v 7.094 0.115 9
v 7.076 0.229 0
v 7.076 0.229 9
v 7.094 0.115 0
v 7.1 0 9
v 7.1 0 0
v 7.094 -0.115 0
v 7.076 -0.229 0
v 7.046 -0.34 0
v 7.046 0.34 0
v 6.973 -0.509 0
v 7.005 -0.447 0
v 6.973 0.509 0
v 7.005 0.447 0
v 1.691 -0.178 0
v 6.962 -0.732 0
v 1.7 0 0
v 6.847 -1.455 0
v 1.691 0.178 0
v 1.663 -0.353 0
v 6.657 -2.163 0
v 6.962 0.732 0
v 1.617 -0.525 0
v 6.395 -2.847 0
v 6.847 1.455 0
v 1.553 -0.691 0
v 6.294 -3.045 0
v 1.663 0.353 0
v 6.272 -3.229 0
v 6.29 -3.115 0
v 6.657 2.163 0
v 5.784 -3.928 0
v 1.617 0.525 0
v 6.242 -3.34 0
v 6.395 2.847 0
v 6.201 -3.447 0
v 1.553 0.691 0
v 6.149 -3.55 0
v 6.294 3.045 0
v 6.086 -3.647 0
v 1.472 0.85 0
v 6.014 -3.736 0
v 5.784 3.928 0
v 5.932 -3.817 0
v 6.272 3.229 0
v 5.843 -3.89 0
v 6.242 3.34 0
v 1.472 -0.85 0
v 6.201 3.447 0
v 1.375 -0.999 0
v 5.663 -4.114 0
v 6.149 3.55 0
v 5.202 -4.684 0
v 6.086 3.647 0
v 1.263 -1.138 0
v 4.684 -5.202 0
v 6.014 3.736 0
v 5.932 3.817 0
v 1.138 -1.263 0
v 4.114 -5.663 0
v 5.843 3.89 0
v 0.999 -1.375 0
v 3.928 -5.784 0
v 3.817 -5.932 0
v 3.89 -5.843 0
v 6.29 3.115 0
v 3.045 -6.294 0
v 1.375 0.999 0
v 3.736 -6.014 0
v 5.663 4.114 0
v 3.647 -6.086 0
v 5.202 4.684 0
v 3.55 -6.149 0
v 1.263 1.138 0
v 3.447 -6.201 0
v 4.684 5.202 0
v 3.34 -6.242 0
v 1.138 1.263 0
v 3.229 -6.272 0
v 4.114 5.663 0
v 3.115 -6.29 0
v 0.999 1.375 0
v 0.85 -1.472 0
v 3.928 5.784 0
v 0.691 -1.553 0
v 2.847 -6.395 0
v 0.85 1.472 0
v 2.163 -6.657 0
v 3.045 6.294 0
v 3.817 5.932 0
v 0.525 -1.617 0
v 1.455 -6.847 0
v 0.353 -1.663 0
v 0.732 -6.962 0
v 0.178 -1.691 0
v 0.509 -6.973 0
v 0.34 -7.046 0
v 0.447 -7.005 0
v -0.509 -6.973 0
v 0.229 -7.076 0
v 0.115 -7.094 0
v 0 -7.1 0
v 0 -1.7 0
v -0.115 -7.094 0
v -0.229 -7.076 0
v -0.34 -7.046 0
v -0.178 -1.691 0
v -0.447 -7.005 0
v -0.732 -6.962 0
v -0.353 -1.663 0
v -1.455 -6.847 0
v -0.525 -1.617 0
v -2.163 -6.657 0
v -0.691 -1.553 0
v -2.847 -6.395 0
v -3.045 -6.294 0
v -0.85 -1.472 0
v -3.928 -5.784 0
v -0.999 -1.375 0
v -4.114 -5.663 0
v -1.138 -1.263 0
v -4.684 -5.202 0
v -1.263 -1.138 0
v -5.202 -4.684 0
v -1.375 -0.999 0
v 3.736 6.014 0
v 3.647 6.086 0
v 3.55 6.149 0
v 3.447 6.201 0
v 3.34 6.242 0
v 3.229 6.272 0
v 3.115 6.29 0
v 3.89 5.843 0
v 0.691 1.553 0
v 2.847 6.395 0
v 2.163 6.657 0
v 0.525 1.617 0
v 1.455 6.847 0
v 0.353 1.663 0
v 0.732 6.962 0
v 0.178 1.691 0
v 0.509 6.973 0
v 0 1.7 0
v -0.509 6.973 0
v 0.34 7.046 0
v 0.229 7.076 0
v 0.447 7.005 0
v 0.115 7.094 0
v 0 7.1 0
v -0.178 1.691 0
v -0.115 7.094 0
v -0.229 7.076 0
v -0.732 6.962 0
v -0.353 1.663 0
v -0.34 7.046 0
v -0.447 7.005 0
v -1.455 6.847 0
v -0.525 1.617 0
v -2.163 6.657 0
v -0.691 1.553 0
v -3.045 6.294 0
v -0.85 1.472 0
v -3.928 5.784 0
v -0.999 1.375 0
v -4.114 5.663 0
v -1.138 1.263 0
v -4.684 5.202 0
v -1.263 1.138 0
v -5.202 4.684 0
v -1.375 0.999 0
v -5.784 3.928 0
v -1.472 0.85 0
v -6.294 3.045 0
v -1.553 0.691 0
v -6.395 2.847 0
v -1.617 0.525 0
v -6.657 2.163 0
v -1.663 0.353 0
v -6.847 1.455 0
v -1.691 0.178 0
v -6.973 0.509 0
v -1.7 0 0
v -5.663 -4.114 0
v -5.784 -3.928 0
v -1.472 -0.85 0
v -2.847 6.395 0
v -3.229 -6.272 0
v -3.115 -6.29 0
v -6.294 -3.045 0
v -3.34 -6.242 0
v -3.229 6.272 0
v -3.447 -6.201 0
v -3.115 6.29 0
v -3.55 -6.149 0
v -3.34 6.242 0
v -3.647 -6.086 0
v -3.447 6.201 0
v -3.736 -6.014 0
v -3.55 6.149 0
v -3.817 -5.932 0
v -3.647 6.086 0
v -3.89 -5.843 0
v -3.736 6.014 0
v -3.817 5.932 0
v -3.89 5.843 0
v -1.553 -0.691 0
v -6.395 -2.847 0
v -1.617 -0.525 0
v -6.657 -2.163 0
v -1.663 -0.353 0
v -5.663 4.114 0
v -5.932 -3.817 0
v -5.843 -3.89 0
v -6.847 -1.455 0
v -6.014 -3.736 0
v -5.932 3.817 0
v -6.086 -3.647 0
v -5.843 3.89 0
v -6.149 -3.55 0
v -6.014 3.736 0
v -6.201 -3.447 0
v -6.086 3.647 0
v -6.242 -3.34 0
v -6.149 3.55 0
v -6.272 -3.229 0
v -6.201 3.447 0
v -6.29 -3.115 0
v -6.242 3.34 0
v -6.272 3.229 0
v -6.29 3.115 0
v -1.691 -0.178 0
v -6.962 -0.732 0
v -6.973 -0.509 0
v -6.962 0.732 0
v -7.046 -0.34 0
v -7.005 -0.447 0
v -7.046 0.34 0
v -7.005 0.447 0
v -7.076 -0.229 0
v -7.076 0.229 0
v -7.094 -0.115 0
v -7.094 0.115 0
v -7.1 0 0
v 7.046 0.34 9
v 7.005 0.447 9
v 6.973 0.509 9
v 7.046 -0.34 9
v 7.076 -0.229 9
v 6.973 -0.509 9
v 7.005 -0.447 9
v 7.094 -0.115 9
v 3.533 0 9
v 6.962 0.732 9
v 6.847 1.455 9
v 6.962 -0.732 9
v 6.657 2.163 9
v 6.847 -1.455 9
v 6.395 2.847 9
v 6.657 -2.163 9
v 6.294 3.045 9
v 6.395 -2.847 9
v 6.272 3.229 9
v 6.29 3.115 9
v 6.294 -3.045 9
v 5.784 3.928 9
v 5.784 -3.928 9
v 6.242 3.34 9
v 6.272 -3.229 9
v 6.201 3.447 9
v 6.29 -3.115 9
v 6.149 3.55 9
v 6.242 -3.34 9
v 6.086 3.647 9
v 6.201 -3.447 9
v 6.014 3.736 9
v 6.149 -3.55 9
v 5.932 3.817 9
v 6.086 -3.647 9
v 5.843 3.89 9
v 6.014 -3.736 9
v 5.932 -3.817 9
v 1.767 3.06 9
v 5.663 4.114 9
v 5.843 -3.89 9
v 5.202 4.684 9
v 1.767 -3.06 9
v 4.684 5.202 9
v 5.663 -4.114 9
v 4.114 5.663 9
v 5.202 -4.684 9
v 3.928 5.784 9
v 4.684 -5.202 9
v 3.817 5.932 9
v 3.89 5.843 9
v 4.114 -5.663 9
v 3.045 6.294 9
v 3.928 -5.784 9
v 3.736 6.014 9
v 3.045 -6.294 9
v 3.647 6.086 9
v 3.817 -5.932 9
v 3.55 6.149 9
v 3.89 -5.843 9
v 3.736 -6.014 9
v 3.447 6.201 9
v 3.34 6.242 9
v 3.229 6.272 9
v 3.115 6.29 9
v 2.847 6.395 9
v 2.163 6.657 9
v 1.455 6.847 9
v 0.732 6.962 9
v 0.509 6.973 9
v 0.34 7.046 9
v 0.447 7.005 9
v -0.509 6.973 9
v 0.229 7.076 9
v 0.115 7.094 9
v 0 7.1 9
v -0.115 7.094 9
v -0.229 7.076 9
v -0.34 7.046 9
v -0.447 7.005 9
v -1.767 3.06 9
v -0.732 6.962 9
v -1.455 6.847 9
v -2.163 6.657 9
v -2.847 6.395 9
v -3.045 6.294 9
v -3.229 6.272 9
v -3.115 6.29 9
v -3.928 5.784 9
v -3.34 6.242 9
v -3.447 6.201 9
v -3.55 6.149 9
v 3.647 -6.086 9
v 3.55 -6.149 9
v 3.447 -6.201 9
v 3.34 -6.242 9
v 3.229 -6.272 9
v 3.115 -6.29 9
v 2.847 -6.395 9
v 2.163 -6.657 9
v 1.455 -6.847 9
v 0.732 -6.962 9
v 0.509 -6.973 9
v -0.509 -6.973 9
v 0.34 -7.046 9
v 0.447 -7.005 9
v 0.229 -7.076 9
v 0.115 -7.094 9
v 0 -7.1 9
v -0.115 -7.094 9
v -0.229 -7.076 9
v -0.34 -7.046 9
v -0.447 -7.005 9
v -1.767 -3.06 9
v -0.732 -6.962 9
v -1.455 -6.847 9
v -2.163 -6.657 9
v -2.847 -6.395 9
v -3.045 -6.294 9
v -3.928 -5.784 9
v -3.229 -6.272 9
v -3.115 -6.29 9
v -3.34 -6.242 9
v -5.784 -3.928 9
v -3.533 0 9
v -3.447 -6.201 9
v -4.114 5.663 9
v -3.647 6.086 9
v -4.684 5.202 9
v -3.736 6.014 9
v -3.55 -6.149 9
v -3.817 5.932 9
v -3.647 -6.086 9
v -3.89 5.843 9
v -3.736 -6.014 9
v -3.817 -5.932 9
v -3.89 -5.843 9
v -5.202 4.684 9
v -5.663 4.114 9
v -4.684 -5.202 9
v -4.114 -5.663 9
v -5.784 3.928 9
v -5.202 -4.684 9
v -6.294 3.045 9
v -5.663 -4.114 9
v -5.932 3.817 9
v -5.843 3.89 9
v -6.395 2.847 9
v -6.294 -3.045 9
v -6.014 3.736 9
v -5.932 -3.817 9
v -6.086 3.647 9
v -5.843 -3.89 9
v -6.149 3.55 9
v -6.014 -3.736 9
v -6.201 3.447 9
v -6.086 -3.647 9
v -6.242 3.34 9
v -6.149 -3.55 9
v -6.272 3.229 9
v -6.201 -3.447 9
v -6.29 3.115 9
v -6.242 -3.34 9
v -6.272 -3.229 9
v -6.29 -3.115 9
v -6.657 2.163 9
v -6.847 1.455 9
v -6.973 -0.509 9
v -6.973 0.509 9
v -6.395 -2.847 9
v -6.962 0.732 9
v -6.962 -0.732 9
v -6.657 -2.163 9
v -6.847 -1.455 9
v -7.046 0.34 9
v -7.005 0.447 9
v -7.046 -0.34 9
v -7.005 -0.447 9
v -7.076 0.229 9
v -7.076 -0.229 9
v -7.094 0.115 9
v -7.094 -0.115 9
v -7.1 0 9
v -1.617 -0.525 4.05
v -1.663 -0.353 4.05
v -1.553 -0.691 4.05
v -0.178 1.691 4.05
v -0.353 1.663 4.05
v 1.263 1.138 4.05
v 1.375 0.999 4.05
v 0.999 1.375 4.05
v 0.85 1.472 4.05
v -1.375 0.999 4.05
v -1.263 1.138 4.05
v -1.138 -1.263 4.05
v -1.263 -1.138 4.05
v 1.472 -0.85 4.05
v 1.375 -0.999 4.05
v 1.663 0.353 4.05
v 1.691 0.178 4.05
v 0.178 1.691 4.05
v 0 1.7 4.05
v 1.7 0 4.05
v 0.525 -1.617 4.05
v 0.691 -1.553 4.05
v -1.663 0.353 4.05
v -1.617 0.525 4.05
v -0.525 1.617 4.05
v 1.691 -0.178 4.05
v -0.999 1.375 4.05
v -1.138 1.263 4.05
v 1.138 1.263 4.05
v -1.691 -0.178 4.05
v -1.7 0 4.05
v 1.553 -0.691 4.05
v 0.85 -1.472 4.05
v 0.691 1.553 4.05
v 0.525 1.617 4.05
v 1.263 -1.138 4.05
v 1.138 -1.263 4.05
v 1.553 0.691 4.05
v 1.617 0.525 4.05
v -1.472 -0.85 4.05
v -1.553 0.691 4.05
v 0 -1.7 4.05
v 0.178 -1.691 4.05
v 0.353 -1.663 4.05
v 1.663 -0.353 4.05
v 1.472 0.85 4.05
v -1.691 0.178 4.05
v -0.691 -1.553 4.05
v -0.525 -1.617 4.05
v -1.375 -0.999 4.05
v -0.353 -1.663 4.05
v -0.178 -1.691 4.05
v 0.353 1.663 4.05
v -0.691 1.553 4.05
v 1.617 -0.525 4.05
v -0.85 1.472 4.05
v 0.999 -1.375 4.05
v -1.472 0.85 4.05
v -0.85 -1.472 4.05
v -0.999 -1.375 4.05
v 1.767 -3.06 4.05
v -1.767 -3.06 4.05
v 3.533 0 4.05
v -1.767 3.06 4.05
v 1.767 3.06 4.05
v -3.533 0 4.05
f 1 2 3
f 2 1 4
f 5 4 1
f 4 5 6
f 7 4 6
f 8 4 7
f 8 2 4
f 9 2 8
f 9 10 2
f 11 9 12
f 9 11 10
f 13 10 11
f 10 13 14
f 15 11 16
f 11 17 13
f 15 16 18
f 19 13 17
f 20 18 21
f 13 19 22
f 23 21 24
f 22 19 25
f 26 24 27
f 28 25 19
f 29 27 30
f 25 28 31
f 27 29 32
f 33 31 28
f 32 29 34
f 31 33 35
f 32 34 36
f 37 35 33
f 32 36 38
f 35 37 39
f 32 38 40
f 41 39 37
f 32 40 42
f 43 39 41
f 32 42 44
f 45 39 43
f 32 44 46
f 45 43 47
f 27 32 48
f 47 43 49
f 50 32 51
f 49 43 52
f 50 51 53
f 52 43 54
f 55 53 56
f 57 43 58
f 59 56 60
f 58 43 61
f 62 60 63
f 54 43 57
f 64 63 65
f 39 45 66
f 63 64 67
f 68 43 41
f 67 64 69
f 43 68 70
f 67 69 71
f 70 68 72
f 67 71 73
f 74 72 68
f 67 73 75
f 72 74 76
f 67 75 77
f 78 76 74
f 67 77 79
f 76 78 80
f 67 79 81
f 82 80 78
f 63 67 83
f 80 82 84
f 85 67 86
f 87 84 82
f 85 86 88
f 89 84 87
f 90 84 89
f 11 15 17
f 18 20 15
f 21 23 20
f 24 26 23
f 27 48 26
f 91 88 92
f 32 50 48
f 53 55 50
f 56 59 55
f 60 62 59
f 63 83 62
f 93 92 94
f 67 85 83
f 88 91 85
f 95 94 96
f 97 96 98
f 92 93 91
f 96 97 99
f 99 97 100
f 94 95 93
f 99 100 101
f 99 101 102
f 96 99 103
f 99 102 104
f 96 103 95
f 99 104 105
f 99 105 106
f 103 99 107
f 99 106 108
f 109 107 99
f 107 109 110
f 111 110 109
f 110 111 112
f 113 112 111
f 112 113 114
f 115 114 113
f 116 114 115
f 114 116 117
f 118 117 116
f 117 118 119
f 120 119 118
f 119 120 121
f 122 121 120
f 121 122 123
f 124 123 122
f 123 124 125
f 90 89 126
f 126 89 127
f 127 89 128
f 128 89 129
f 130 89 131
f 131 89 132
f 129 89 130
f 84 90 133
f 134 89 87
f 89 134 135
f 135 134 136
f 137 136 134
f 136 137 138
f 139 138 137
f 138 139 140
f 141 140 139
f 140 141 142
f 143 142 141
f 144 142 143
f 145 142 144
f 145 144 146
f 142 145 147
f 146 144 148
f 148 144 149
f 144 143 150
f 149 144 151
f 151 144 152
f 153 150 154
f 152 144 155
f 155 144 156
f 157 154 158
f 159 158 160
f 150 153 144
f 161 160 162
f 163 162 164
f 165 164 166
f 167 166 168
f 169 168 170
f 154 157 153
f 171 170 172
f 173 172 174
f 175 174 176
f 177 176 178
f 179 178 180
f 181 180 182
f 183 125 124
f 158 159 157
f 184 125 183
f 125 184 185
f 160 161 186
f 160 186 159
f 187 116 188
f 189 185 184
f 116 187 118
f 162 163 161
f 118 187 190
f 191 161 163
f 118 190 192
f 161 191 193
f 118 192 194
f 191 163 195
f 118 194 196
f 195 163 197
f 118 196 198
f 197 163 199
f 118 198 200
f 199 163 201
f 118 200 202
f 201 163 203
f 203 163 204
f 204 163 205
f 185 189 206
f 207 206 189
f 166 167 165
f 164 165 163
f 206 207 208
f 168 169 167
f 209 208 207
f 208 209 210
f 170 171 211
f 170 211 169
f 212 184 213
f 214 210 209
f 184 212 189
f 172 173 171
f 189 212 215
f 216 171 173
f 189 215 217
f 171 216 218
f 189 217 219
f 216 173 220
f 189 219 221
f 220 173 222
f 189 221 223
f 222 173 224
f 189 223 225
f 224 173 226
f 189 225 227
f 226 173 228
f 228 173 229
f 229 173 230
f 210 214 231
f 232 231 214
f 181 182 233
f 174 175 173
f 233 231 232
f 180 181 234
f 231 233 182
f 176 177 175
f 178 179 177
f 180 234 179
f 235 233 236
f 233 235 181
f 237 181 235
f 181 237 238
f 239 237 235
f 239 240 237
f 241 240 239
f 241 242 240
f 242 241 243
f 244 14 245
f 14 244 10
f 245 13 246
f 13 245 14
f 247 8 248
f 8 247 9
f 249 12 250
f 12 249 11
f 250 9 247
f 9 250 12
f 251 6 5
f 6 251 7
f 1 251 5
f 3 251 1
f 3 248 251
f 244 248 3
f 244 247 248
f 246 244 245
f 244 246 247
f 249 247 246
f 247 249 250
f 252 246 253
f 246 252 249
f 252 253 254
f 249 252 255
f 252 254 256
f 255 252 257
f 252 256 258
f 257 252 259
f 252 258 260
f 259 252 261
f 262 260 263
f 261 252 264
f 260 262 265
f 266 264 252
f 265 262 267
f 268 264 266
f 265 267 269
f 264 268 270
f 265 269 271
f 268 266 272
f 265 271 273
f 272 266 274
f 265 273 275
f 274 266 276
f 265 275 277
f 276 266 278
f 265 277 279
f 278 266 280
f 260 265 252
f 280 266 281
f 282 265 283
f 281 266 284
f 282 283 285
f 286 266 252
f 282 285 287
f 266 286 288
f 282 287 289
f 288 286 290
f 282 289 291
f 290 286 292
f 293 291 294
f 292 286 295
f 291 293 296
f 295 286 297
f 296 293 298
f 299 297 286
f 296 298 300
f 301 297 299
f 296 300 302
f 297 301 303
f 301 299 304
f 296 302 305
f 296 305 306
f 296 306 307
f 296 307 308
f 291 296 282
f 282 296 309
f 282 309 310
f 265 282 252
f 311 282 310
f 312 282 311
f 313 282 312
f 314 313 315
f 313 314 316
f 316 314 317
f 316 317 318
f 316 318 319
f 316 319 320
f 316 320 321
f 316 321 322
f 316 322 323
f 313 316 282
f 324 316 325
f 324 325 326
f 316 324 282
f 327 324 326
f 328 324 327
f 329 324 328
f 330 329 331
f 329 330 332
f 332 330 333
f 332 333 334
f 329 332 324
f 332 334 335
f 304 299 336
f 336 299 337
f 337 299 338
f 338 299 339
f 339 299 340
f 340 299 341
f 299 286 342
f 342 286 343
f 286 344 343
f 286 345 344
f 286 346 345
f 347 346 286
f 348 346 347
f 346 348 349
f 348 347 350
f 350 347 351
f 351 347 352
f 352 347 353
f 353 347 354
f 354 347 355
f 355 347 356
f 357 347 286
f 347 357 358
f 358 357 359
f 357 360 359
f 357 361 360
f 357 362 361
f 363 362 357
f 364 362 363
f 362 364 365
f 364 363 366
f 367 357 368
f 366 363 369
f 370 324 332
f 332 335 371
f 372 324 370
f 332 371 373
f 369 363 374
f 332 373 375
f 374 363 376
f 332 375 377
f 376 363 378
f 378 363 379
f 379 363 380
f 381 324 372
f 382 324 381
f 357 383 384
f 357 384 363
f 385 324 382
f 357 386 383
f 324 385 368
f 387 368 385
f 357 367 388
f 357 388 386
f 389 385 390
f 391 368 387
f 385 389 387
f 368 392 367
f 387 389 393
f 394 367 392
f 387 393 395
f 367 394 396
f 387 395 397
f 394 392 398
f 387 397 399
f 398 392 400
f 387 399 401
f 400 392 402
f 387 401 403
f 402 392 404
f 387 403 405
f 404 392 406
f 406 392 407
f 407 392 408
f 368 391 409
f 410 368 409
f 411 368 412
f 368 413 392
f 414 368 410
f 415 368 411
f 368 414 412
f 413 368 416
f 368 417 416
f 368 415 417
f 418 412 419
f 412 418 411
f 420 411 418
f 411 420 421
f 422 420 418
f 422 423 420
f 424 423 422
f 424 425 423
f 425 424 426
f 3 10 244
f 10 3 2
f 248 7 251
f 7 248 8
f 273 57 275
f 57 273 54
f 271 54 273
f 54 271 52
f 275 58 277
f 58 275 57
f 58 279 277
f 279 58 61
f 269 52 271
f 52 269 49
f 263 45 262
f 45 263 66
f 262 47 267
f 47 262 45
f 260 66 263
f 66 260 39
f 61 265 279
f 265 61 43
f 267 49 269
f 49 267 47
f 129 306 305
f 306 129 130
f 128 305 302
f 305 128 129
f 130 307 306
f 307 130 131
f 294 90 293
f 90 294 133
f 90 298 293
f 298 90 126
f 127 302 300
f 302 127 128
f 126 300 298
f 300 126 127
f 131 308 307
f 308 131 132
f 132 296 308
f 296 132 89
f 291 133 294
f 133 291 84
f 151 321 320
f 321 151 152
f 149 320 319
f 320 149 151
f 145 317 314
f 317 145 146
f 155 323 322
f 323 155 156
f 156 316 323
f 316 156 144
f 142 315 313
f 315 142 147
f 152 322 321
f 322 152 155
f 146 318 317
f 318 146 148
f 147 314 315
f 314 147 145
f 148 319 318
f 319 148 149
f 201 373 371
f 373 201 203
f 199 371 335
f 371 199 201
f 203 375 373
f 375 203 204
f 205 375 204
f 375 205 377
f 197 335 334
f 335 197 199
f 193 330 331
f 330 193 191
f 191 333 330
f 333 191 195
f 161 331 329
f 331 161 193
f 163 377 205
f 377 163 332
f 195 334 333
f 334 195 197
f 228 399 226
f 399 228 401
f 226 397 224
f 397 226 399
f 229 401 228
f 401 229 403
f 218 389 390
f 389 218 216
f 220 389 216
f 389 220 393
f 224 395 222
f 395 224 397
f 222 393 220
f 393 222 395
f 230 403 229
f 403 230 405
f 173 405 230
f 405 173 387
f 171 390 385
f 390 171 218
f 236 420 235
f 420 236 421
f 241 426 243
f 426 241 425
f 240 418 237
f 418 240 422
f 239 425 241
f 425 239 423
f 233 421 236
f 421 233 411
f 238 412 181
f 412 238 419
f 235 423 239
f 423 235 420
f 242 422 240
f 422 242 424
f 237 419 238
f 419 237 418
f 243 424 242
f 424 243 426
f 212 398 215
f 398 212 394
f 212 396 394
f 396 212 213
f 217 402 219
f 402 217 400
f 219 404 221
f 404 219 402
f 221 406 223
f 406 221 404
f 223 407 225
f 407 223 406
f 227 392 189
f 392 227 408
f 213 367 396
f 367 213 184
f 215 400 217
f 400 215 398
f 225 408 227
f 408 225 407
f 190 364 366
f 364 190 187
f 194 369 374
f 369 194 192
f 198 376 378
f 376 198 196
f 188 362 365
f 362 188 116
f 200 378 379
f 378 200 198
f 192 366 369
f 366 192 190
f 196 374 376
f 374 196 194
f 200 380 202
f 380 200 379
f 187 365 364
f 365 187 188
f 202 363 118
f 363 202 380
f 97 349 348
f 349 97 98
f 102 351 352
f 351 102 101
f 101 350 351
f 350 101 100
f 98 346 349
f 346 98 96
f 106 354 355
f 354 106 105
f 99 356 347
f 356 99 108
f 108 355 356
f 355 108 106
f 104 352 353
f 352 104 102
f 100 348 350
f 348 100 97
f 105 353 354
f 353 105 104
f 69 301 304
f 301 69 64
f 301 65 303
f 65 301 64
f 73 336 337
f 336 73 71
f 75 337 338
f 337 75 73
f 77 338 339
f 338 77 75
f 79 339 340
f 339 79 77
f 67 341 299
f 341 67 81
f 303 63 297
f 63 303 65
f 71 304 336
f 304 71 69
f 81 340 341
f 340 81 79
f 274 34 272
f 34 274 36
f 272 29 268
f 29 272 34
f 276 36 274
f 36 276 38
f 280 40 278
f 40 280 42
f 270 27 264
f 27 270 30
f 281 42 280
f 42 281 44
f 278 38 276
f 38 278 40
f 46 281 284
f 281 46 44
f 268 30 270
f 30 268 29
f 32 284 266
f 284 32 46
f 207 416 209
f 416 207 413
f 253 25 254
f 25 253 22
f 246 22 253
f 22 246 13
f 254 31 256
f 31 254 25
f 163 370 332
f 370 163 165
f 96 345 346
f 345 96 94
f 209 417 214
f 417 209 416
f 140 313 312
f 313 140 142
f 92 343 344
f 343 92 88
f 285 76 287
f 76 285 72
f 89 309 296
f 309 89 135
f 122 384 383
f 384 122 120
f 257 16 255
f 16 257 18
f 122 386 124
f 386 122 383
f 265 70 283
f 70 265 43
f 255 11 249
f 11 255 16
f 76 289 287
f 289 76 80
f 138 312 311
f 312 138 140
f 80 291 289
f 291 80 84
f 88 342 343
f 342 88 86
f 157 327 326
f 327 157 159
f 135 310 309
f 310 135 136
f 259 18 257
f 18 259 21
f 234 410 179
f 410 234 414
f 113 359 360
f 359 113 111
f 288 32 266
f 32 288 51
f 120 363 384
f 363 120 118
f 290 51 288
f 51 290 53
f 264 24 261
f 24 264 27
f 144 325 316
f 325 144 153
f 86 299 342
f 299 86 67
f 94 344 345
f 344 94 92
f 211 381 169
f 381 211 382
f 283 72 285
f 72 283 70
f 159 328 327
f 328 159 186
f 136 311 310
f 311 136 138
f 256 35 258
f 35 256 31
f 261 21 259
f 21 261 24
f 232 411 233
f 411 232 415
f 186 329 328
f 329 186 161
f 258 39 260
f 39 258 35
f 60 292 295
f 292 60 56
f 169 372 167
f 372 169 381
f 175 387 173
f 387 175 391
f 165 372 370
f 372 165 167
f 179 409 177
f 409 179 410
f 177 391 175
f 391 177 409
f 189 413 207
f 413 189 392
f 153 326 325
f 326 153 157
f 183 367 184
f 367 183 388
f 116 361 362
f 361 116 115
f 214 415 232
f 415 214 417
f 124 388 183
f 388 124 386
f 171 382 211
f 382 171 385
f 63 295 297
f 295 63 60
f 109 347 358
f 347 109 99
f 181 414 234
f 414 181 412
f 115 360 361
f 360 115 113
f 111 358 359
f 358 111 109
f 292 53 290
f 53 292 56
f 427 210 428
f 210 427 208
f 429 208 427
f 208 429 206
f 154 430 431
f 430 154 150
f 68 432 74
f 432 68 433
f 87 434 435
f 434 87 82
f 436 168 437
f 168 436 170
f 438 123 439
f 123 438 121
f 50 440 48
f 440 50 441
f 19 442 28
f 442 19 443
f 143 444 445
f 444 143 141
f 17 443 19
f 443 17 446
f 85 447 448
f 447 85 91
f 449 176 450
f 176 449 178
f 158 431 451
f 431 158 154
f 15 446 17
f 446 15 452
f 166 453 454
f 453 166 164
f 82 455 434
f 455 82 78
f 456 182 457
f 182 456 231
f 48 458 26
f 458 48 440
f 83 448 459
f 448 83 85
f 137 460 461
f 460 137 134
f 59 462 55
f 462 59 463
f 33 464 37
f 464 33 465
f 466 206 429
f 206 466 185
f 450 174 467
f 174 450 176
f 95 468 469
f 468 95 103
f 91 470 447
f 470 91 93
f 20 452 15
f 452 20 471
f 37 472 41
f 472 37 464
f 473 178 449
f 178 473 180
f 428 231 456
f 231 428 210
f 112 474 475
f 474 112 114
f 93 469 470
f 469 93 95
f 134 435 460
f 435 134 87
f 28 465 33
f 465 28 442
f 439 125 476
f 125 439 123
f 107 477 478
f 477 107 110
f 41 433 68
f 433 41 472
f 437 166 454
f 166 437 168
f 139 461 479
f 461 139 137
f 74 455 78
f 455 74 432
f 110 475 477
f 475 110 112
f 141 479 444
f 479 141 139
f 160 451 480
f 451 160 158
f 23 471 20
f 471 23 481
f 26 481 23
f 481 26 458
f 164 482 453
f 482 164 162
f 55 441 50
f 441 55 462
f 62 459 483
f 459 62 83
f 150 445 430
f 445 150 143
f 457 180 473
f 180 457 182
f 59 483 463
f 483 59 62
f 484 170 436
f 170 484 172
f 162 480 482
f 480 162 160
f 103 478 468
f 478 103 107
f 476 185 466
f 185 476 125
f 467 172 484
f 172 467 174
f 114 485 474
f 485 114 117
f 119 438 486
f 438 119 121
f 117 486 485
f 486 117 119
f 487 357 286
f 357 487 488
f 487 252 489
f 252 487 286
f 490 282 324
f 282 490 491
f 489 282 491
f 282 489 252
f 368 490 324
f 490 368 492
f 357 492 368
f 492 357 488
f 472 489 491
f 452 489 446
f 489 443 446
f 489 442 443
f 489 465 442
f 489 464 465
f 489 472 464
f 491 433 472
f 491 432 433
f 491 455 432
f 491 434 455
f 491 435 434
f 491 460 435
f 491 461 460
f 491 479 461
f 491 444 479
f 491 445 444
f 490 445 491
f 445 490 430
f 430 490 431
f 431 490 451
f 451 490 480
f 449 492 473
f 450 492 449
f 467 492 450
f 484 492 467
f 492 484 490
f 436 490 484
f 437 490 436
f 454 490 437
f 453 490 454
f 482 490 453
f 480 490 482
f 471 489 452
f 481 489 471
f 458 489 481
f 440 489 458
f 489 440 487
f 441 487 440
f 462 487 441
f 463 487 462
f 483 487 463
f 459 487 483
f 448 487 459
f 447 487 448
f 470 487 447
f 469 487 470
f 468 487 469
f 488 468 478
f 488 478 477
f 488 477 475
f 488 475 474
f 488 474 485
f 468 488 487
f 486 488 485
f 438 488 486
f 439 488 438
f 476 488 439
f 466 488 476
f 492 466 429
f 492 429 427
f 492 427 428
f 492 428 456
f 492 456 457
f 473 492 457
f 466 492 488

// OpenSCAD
// Knurled-style thumb knob with hex socket.
$fn = 60;
eps = 0.02;
thread_d = 3.4;
knob_d = 14;
knob_h = 9;
socket_flat = thread_d * 1.8;
difference() {
    union() {
        cylinder(d = knob_d, h = knob_h);
        for (i = [0 : 11]) rotate([0, 0, i * 30]) translate([knob_d / 2 - 1, 0, 0]) cylinder(d = 2.2, h = knob_h);
    }
    translate([0, 0, -eps]) cylinder(d = thread_d, h = knob_h + 2 * eps);
    translate([0, 0, knob_h - knob_h * 0.55]) cylinder(d = socket_flat / cos(30), h = knob_h * 0.55 + eps, $fn = 6);
}
